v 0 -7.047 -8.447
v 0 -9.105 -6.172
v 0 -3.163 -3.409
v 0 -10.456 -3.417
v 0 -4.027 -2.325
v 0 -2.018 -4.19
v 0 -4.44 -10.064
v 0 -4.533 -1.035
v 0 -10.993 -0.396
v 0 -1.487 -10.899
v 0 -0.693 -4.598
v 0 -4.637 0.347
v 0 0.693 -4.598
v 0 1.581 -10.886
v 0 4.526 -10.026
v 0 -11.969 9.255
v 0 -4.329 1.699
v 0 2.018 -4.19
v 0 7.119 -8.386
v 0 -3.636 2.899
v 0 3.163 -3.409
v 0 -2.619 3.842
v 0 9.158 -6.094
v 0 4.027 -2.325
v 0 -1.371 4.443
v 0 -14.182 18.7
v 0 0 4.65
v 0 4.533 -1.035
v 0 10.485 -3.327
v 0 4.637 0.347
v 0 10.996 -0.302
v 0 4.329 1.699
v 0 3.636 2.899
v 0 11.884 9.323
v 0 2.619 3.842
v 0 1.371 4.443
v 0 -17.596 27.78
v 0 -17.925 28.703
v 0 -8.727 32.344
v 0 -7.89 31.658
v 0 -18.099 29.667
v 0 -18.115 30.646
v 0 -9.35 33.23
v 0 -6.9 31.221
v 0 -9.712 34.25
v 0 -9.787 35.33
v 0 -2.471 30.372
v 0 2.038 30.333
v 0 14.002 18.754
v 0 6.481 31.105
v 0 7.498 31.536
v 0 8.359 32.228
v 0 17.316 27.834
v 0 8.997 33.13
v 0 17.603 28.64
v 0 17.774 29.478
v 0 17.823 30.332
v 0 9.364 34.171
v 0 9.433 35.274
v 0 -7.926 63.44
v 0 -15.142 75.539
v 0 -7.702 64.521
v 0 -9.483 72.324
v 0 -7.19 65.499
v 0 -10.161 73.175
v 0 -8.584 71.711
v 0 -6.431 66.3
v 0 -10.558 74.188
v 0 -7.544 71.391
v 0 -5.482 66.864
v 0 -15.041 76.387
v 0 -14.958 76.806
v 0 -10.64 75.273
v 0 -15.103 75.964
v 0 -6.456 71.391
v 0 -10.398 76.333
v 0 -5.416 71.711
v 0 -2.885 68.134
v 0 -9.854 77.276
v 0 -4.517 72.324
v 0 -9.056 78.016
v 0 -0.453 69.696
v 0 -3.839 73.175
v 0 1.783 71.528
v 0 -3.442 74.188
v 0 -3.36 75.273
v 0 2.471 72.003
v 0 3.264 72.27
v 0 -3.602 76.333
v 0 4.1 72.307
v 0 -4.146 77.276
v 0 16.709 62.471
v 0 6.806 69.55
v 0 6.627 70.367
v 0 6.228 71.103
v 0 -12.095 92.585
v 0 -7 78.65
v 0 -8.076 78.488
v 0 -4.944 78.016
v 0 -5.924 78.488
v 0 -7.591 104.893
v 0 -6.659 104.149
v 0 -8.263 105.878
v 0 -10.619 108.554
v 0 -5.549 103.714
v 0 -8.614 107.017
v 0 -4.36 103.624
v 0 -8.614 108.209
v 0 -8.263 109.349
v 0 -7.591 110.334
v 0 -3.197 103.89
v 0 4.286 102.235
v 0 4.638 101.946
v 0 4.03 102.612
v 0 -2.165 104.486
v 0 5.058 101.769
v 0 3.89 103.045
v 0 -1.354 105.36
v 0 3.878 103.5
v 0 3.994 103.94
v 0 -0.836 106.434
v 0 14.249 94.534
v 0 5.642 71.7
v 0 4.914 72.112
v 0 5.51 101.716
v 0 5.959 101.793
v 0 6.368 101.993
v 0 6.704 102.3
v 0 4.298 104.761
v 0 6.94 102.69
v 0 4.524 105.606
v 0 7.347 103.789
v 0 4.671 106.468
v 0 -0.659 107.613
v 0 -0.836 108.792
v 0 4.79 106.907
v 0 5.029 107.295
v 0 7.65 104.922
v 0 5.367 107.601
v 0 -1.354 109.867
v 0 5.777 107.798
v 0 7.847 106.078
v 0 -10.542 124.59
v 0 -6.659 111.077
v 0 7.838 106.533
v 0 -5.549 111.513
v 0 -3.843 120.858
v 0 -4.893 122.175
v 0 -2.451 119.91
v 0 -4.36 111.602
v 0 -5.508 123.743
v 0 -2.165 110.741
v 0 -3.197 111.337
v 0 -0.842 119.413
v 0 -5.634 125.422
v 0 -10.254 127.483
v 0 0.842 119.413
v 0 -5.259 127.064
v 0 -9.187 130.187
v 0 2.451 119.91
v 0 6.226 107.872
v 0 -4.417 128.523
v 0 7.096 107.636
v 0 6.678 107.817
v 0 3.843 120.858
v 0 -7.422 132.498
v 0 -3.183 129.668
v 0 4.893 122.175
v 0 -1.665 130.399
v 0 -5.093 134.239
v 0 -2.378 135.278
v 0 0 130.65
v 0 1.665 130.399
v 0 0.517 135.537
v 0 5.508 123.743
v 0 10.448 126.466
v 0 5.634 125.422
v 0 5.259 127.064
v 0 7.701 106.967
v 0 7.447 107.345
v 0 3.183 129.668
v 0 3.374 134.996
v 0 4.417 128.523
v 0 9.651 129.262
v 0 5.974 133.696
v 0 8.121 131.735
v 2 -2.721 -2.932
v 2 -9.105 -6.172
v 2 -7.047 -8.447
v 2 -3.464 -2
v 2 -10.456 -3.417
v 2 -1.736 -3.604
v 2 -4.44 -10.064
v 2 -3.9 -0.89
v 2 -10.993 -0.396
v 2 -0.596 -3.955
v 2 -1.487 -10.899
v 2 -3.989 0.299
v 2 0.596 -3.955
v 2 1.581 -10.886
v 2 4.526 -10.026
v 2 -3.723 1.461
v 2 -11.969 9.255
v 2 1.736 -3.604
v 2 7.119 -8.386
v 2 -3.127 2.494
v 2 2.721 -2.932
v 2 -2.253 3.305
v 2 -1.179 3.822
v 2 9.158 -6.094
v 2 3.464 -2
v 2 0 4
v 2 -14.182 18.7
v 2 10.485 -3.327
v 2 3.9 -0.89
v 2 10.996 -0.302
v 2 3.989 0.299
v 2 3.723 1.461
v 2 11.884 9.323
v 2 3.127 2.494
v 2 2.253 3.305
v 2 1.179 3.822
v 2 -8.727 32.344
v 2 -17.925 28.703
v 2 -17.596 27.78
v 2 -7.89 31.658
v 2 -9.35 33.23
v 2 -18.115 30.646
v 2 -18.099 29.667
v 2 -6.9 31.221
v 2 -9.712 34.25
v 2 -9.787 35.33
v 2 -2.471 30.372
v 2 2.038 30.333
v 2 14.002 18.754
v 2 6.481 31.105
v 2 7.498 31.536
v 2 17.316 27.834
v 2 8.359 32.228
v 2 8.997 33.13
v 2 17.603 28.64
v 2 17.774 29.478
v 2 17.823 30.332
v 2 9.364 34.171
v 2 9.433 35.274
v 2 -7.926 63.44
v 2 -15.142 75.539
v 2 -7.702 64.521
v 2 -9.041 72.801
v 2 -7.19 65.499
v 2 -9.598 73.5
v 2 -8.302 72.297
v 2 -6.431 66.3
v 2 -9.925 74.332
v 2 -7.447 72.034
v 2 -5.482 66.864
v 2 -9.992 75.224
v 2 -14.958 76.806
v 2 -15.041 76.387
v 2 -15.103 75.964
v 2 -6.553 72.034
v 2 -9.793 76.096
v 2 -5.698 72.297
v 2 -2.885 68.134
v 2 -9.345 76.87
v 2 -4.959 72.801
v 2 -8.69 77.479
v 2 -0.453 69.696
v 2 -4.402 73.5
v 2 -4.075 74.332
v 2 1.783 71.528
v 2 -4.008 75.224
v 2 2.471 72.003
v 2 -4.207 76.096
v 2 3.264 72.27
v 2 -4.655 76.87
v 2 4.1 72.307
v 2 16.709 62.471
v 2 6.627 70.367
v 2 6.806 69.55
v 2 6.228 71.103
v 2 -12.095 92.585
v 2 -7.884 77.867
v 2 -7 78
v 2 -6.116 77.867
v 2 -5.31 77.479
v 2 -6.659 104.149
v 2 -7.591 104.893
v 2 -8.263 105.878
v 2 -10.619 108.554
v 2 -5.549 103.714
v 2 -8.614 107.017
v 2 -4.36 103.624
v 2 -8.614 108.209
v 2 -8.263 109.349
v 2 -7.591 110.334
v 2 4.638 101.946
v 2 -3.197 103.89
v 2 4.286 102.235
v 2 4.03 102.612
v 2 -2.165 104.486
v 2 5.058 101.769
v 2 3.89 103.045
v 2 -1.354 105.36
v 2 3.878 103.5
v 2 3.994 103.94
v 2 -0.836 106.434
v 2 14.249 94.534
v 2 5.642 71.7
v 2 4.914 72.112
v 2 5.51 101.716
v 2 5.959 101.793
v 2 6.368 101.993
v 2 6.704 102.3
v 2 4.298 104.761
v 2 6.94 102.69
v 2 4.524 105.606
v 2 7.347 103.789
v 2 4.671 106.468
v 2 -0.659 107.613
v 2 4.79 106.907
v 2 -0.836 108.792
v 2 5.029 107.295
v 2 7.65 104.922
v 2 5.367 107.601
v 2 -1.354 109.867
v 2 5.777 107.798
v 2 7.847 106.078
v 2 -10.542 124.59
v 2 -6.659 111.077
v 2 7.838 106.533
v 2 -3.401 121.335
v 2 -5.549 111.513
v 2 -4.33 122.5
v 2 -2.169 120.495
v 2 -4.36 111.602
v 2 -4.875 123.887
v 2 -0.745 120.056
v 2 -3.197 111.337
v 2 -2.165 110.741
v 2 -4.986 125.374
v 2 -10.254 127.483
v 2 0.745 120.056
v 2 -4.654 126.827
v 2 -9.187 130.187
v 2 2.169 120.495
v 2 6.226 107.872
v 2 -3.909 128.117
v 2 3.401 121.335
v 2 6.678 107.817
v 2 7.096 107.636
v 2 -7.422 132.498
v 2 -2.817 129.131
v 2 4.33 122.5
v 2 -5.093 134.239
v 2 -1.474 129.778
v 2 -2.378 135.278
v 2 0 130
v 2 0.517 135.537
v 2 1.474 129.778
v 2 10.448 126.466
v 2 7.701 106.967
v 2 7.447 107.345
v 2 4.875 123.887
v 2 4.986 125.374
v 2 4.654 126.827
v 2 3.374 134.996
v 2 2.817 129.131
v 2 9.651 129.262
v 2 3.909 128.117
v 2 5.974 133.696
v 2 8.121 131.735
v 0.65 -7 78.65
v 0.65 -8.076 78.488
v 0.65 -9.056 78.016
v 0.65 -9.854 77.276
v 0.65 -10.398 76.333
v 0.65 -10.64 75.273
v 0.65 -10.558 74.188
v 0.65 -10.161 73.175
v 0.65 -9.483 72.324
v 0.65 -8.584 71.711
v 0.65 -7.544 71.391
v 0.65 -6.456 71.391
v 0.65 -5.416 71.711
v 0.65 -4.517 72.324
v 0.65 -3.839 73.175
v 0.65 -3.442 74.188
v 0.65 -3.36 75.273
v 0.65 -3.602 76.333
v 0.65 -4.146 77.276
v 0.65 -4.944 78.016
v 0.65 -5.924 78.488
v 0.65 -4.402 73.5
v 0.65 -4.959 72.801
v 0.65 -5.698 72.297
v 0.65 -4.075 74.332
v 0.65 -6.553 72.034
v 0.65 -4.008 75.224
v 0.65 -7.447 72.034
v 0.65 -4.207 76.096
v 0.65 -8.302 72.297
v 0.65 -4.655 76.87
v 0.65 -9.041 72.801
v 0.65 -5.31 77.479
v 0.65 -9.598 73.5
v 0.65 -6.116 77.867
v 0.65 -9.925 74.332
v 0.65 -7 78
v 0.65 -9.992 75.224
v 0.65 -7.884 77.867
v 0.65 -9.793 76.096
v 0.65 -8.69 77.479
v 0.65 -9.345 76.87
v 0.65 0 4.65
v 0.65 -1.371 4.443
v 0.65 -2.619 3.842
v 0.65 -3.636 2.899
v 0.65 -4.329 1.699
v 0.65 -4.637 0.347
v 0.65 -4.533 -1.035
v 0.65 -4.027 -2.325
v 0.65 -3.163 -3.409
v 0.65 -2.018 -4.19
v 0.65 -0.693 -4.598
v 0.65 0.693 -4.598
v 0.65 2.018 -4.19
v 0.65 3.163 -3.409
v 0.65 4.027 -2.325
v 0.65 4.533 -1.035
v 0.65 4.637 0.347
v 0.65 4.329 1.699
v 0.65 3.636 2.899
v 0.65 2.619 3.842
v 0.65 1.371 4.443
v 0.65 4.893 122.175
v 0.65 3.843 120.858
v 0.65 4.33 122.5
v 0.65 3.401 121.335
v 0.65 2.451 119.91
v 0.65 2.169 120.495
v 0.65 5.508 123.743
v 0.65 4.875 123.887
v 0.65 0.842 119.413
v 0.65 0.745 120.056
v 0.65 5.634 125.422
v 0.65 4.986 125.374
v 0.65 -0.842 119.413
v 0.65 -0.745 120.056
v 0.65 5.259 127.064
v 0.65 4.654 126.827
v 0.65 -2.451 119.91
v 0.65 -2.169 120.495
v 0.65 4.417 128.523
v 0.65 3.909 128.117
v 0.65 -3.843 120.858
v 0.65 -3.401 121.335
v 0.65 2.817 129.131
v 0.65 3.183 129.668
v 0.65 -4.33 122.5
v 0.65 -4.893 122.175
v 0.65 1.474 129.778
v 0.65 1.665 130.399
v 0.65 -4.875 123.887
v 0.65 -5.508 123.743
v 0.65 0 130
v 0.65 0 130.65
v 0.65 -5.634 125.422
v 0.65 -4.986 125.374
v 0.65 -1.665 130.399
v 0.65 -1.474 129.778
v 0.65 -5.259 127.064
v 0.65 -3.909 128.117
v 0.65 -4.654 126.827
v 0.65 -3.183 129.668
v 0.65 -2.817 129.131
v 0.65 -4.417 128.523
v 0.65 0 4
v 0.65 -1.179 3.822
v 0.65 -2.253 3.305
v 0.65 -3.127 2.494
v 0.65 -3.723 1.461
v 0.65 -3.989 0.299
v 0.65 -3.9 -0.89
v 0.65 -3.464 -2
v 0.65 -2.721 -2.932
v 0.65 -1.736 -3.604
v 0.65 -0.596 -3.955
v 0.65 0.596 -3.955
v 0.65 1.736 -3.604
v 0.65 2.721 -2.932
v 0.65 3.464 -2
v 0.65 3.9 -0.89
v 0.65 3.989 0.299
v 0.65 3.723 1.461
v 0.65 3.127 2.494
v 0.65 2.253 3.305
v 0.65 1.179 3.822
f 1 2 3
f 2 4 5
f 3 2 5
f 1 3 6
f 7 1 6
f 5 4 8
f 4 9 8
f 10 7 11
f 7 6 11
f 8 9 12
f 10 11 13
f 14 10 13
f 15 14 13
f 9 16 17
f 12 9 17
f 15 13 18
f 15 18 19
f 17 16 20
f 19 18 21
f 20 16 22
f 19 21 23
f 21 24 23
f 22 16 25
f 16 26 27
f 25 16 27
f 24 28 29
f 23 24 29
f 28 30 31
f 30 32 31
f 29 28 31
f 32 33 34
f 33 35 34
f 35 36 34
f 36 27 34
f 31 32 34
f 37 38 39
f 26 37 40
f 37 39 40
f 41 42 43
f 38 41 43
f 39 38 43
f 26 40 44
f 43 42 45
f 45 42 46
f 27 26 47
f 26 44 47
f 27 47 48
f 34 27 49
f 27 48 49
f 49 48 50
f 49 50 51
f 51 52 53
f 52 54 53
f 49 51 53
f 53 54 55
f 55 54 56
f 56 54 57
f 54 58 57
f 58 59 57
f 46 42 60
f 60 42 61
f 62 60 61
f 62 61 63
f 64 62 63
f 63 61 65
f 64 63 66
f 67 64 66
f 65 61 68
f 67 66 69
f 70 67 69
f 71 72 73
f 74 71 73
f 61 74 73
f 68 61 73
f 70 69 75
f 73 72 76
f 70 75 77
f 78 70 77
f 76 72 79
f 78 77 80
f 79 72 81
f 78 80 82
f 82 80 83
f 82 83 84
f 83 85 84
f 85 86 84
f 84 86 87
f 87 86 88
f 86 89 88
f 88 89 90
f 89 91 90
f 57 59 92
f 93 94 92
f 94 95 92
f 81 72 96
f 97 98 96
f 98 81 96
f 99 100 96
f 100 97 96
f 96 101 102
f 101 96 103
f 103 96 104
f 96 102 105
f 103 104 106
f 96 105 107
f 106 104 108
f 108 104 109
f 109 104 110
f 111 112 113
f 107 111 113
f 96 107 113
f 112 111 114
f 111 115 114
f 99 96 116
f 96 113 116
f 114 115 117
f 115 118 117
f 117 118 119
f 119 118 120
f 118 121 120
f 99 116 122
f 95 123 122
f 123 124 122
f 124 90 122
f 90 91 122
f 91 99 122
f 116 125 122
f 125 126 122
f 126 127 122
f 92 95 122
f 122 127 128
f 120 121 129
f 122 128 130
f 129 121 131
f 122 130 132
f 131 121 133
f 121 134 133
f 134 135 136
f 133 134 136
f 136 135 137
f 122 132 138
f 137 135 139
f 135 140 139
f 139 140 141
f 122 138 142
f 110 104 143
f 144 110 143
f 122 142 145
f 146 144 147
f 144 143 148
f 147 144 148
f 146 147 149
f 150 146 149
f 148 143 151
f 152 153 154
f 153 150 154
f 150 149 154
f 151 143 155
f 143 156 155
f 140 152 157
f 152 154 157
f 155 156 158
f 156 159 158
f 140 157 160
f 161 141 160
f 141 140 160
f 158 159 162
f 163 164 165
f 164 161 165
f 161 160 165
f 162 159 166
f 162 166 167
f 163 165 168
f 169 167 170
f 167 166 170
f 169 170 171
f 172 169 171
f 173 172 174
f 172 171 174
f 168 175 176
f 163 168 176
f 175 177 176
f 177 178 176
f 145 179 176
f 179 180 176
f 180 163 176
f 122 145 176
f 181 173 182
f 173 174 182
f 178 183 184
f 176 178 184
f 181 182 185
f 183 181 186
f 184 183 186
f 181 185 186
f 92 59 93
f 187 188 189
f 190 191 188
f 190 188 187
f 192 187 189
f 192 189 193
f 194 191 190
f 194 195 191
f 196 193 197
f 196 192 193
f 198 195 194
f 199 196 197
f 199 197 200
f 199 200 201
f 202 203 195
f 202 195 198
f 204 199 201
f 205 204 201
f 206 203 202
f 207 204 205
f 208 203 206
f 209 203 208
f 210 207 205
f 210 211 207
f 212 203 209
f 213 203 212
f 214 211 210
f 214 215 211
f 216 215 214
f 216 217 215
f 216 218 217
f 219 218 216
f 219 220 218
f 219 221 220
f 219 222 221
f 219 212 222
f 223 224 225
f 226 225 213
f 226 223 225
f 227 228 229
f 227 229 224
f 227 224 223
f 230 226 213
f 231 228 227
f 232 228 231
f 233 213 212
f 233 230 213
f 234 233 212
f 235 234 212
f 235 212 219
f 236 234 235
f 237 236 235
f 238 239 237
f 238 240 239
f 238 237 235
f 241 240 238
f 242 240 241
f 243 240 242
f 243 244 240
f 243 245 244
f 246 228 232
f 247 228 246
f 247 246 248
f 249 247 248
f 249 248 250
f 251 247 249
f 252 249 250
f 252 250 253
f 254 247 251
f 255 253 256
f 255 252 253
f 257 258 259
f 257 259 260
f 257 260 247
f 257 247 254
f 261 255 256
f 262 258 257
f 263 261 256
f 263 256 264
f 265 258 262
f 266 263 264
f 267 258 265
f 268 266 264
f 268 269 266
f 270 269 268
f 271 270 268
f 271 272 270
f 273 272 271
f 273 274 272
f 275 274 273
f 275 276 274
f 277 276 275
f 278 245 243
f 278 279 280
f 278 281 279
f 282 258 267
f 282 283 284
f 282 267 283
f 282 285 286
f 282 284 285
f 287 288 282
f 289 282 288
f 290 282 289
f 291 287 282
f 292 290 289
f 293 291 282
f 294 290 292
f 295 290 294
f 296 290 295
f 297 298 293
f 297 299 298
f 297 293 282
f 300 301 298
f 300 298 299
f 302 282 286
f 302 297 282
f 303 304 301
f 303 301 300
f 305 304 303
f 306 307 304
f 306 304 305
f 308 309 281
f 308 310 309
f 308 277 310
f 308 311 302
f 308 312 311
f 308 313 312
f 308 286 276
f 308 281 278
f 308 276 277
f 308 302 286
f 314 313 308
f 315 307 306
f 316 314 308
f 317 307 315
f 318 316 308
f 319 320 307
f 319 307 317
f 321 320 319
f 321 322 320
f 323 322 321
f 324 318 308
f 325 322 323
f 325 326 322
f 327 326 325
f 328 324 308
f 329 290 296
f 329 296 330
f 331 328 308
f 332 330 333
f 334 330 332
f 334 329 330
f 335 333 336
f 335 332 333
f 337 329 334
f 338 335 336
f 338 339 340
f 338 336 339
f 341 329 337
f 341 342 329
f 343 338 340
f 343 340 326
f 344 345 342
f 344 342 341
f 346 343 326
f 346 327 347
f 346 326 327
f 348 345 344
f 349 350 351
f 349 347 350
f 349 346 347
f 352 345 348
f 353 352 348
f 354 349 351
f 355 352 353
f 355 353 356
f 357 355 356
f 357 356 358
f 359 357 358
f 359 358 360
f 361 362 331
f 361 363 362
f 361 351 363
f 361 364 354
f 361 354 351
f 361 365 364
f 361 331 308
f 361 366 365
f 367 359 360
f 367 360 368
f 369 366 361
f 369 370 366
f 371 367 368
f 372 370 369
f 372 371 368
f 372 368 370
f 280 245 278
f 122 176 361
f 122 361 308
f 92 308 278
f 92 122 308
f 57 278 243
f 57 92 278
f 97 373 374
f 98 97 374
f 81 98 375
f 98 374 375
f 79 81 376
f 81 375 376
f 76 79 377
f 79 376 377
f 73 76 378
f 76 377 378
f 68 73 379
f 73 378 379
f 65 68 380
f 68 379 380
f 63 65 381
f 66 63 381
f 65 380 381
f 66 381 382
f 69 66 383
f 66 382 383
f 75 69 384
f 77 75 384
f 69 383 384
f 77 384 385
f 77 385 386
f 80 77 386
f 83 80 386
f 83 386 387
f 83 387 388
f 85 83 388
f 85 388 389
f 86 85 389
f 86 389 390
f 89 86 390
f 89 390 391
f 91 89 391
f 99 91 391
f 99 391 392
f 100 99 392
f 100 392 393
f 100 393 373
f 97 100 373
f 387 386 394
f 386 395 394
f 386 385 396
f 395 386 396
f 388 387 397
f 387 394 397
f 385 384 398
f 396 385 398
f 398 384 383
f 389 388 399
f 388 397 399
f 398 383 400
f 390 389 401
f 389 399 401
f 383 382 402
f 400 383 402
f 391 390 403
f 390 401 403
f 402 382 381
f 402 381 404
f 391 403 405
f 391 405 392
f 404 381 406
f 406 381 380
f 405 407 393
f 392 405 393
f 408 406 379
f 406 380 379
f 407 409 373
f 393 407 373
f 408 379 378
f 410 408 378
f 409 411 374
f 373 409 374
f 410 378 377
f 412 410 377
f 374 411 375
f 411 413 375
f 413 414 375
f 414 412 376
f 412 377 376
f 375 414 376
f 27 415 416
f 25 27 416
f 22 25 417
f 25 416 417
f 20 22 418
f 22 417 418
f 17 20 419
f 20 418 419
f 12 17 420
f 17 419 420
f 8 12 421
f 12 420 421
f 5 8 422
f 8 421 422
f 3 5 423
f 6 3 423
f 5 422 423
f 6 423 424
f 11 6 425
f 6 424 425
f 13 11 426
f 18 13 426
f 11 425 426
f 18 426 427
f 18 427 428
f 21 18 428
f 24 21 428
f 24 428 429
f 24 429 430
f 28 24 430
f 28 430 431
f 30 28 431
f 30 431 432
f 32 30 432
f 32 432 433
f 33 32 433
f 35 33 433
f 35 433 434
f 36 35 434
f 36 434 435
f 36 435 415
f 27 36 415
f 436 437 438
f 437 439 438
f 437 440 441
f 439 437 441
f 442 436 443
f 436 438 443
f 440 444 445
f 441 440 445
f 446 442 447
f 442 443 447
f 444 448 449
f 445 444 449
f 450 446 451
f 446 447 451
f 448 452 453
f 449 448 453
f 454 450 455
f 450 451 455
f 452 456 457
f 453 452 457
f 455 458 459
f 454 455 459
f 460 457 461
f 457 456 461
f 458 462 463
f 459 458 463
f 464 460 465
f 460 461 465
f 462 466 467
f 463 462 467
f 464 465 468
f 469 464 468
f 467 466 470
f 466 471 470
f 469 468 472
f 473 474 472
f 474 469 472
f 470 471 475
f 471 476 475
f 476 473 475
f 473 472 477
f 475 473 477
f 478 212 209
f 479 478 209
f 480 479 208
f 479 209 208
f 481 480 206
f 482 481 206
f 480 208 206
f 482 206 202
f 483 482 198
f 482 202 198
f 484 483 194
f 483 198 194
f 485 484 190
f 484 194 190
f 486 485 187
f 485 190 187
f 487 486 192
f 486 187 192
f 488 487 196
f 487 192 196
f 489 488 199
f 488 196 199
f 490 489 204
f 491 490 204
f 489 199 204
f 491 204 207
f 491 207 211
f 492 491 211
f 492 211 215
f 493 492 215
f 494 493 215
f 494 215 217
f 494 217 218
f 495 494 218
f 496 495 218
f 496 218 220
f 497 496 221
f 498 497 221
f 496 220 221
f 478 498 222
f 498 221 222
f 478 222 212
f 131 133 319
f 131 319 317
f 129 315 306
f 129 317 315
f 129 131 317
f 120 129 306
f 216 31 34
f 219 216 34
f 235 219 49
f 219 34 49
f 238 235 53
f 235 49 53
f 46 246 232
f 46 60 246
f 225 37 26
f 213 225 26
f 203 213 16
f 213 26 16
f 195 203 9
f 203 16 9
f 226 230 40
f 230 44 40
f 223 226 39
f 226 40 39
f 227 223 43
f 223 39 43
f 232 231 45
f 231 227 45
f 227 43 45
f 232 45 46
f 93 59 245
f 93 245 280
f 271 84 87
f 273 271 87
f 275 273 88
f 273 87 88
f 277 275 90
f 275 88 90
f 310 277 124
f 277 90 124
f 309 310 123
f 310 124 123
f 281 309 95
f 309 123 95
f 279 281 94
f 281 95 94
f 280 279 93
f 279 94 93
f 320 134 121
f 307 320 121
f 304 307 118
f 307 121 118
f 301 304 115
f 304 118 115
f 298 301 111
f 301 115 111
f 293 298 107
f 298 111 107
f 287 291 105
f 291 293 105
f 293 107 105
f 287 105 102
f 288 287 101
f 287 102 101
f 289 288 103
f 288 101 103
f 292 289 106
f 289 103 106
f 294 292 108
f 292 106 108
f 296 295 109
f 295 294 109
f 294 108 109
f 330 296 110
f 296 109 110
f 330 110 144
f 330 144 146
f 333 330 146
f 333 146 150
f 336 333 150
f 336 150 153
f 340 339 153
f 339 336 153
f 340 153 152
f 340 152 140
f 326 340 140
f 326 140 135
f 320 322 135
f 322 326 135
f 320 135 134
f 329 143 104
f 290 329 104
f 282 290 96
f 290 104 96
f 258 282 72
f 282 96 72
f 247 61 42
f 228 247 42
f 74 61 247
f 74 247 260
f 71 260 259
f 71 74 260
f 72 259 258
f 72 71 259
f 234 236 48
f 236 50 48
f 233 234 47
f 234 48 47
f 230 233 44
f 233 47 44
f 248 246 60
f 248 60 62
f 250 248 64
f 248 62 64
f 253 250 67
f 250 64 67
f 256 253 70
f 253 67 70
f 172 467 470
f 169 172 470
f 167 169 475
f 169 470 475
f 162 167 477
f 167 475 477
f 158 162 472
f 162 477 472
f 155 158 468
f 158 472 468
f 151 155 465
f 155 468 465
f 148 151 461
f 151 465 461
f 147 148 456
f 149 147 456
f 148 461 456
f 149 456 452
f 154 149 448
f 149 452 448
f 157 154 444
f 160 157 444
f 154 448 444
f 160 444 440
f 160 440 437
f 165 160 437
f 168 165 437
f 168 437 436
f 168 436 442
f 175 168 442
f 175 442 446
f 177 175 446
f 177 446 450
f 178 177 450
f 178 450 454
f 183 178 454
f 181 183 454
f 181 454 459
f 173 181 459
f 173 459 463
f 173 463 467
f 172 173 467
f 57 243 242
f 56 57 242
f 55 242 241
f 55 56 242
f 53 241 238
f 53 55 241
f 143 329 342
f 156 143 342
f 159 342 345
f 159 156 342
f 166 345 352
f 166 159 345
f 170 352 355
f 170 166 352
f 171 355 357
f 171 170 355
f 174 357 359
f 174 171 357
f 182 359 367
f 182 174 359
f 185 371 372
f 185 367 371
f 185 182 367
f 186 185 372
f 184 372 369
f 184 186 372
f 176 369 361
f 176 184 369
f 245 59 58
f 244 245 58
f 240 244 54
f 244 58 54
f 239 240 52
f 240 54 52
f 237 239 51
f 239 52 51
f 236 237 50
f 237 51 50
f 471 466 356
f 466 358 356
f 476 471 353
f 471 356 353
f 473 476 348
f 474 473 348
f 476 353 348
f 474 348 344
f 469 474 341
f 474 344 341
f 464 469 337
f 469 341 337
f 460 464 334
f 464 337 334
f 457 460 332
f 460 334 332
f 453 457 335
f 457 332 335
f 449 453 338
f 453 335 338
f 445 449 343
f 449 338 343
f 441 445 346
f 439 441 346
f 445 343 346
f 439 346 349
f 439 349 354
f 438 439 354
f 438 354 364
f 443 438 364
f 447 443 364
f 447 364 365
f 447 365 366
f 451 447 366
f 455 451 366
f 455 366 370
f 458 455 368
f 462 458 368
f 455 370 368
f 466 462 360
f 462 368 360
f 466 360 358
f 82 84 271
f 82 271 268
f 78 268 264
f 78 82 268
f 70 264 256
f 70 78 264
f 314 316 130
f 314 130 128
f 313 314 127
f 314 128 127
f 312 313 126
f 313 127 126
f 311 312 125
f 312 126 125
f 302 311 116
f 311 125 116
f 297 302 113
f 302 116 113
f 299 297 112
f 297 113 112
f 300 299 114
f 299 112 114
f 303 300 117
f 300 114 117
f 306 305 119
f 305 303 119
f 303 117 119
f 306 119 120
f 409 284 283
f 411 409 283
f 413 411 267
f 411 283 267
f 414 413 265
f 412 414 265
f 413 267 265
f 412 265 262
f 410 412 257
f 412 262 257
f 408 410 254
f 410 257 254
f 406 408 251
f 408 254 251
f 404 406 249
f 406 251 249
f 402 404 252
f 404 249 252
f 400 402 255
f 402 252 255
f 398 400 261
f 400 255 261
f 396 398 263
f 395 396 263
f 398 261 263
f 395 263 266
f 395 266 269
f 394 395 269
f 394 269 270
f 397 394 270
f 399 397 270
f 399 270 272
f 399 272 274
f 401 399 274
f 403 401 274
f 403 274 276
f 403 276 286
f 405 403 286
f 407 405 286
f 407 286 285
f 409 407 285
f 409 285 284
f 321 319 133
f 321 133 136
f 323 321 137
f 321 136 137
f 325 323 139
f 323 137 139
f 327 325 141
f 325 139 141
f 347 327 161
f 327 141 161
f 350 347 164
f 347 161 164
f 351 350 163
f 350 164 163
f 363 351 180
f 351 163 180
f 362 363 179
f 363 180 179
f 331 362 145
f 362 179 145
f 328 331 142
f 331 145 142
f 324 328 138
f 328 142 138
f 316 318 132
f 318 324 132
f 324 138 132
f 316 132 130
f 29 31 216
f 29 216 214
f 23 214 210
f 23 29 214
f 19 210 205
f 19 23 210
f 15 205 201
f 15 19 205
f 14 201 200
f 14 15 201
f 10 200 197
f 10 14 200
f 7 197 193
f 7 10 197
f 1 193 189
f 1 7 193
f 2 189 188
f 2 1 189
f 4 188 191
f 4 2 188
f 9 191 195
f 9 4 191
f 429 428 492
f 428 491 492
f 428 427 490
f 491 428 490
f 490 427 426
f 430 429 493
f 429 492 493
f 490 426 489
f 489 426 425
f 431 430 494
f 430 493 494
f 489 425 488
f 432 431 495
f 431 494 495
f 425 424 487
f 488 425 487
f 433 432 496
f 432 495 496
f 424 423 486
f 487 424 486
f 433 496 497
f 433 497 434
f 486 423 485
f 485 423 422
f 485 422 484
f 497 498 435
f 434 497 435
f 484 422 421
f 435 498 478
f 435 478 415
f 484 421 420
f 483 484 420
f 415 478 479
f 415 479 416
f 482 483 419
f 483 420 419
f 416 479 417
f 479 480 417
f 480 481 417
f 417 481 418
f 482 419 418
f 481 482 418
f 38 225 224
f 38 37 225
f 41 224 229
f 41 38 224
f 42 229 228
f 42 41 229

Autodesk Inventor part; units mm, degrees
ref_plane "YZ Plane" through (0, 0, 0) normal (1, 0, 0) x (0, 1, 0)
ref_plane "XZ Plane" through (0, 0, 0) normal (0, 1, 0) x (-1, 0, 0)
ref_plane "XY Plane" through (0, 0, 0) normal (0, 0, 1) x (1, 0, 0)
sketch "スケッチ1" plane through (0, 0, 0) normal (1, 0, 0) x (0, 1, 0)
  line L0 (0, 0) -> (0, 125) construction
  arc A0 (10.4476, 126.4665) -> (-10.542, 124.5901) centre (0, 125) ccw
  arc A1 (9.5221, 125.7296) -> (-7.8176, 119.5148) centre (0, 125) ccw construction
  line L1 (9.5221, 125.7296) -> (19.0442, 1.4592) construction
  line L2 (-7.8176, 119.5148) -> (-1.1797, 110.0544) construction
  arc A2 (-0.7923, 105.8489) -> (-1.1797, 110.0544) centre (-4.6587, 107.6133) ccw construction
  circle A3 centre (-4.6587, 107.6133) radius 4
  arc A4 (-4.5464, 108.0035) -> (-4.7566, 107.2192) centre (5.9664, 104.7663) ccw construction
  circle A5 centre (5.9664, 104.7663) radius 1.6 construction
  arc A6 (17.3156, 27.8342) -> (10.9958, -0.3023) centre (85.9675, -2.3638) ccw
  arc A7 (-10.9929, -0.3964) -> (10.9958, -0.3023) centre (0, 0) ccw
  arc A8 (-10.9929, -0.3964) -> (-17.5957, 27.7797) centre (-85.9441, -3.099) ccw
  line L3 (-15.1422, 75.5391) -> (-18.1148, 30.6464)
  line L4 (5.9664, 104.7663) -> (-4.6587, 107.6133) construction
  arc A9 (-18.742, 3.6807) -> (19.0442, 1.4592) centre (0, 0) ccw construction
  arc A10 (17.3156, 27.8342) -> (17.8229, 30.3321) centre (11.8235, 30.25) ccw
  arc A11 (-18.1148, 30.6464) -> (-17.5957, 27.7797) centre (-12.1279, 30.25) ccw
  line L5 (10.9958, -0.3023) -> (0, 0) construction
  line L6 (0, 0) -> (-10.9929, -0.3964) construction
  line L7 (9.4327, 35.2736) -> (6.8063, 69.5498)
  line L8 (-7.9258, 63.4396) -> (-9.7871, 35.3299)
  arc A12 (-6.8998, 31.221) -> (6.4814, 31.1048) centre (0, 55.25) ccw
  arc A13 (6.4814, 31.1048) -> (9.4327, 35.2736) centre (5.4444, 34.968) ccw
  arc A14 (-9.7871, 35.3299) -> (-6.8998, 31.221) centre (-5.7959, 35.0656) ccw
  arc A15 (-5.4818, 66.8639) -> (-7.9258, 63.4396) centre (-3.9346, 63.1753) ccw
  line L9 (-0.7923, 105.8489) -> (-13.5138, 77.9726) construction
  line L10 (-14.1444, 75.4731) -> (-19.3486, -3.1223) construction
  arc A16 (-13.5138, 77.9726) -> (-14.1444, 75.4731) centre (-7, 75) ccw construction
  arc A17 (-14.9577, 76.8059) -> (-15.1422, 75.5391) centre (-7, 75) ccw
  circle A18 centre (-4.6587, 107.6133) radius 6 construction
  arc A19 (6.9396, 102.6901) -> (7.8473, 106.0778) centre (-4.6587, 107.6133) ccw
  arc A20 (3.994, 103.9405) -> (4.6712, 106.4678) centre (-4.6587, 107.6133) ccw
  arc A21 (7.8473, 106.0778) -> (4.6712, 106.4678) centre (6.2593, 106.2728) ccw
  arc A22 (3.994, 103.9405) -> (6.9396, 102.6901) centre (5.4668, 103.3153) ccw
  line L11 (6.2593, 106.2728) -> (-4.6587, 107.6133) construction
  line L12 (-4.6587, 107.6133) -> (5.4668, 103.3153) construction
  line L13 (11.8235, 30.25) -> (-12.1279, 30.25) construction
  arc A23 (6.8063, 69.5498) -> (1.7829, 71.5275) centre (3.8151, 69.3206) ccw
  arc A24 (-5.4818, 66.8639) -> (1.7829, 71.5275) centre (-15.1521, 89.9179) ccw
  arc A25 (17.8229, 30.3321) -> (10.4476, 126.4665) centre (-749.1865, 19.8382) ccw
  line L14 (12.0148, 125.9206) -> (21.5369, 1.6502) construction
  line L15 (11.4747, 113.335) -> (17.1037, 39.8734) construction
  arc A26 (-14.9577, 76.8059) -> (-10.542, 124.5901) centre (-194.0689, 117.4533) ccw
  line L16 (0, 125) -> (-4.6587, 107.6133) construction
  circle A27 centre (-7, 75) radius 8 construction
  line L17 (3.8151, 69.3206) -> (-3.9346, 63.1753) construction
  line L18 (-7, 75) -> (-0.0598, 66.2479) construction
  point P0 (-14.406, 86.6566)
  point P1 (17.9231, 29.1792)
  point P2 (-14.4228, 86.4034)
  point P3 (-9.9857, 32.3309)
  point P4 (9.6685, 32.1953)
  point P5 (7.074, 66.0557)
  dimension "d2" = 125
  dimension "d10" = 19.1
  dimension "d13" = 8
  dimension "d14" = 0.25
  dimension "d20" = 3.2
  dimension "d25" = 11
  dimension "d75" = 19.1
  dimension "d79" = 1
  dimension "d86" = 6
  dimension "d87" = 75
  dimension "d95" = 8
  dimension "d96" = 4
  dimension "d109" = 1
  dimension "d111" = 75
  dimension "d116" = 12
  dimension "d117" = 11
  dimension "d118" = 16
  dimension "d119" = 30.25
  dimension "d120" = 25
  dimension "d124" = 3
  dimension "d128" = 25
  dimension "d130" = 2.5
  dimension "d131" = 8
  dimension "d132" = 18
  dimension "d133" = 15
  dimension "d134" = 7
  dimension "d135" = 16
  dimension "d136" = 7.16
extrude "押し出し1" add sketch "スケッチ1" along normal blind 2
hole "穴1" at (0, 0, 0) direction (1, 0, 0) diameter 8 end through all counterbore diameter 9.3 counterbore depth 0.65
hole "穴2" at (0, -7, 75) direction (1, 0, 0) diameter 6 end through all counterbore diameter 7.3 counterbore depth 0.65
hole "穴3" at (0, 0, 125) direction (1, 0, 0) diameter 10 end through all counterbore diameter 11.3 counterbore depth 0.65
properties part number "UPPER_LEG_OUTER_FRAME"
